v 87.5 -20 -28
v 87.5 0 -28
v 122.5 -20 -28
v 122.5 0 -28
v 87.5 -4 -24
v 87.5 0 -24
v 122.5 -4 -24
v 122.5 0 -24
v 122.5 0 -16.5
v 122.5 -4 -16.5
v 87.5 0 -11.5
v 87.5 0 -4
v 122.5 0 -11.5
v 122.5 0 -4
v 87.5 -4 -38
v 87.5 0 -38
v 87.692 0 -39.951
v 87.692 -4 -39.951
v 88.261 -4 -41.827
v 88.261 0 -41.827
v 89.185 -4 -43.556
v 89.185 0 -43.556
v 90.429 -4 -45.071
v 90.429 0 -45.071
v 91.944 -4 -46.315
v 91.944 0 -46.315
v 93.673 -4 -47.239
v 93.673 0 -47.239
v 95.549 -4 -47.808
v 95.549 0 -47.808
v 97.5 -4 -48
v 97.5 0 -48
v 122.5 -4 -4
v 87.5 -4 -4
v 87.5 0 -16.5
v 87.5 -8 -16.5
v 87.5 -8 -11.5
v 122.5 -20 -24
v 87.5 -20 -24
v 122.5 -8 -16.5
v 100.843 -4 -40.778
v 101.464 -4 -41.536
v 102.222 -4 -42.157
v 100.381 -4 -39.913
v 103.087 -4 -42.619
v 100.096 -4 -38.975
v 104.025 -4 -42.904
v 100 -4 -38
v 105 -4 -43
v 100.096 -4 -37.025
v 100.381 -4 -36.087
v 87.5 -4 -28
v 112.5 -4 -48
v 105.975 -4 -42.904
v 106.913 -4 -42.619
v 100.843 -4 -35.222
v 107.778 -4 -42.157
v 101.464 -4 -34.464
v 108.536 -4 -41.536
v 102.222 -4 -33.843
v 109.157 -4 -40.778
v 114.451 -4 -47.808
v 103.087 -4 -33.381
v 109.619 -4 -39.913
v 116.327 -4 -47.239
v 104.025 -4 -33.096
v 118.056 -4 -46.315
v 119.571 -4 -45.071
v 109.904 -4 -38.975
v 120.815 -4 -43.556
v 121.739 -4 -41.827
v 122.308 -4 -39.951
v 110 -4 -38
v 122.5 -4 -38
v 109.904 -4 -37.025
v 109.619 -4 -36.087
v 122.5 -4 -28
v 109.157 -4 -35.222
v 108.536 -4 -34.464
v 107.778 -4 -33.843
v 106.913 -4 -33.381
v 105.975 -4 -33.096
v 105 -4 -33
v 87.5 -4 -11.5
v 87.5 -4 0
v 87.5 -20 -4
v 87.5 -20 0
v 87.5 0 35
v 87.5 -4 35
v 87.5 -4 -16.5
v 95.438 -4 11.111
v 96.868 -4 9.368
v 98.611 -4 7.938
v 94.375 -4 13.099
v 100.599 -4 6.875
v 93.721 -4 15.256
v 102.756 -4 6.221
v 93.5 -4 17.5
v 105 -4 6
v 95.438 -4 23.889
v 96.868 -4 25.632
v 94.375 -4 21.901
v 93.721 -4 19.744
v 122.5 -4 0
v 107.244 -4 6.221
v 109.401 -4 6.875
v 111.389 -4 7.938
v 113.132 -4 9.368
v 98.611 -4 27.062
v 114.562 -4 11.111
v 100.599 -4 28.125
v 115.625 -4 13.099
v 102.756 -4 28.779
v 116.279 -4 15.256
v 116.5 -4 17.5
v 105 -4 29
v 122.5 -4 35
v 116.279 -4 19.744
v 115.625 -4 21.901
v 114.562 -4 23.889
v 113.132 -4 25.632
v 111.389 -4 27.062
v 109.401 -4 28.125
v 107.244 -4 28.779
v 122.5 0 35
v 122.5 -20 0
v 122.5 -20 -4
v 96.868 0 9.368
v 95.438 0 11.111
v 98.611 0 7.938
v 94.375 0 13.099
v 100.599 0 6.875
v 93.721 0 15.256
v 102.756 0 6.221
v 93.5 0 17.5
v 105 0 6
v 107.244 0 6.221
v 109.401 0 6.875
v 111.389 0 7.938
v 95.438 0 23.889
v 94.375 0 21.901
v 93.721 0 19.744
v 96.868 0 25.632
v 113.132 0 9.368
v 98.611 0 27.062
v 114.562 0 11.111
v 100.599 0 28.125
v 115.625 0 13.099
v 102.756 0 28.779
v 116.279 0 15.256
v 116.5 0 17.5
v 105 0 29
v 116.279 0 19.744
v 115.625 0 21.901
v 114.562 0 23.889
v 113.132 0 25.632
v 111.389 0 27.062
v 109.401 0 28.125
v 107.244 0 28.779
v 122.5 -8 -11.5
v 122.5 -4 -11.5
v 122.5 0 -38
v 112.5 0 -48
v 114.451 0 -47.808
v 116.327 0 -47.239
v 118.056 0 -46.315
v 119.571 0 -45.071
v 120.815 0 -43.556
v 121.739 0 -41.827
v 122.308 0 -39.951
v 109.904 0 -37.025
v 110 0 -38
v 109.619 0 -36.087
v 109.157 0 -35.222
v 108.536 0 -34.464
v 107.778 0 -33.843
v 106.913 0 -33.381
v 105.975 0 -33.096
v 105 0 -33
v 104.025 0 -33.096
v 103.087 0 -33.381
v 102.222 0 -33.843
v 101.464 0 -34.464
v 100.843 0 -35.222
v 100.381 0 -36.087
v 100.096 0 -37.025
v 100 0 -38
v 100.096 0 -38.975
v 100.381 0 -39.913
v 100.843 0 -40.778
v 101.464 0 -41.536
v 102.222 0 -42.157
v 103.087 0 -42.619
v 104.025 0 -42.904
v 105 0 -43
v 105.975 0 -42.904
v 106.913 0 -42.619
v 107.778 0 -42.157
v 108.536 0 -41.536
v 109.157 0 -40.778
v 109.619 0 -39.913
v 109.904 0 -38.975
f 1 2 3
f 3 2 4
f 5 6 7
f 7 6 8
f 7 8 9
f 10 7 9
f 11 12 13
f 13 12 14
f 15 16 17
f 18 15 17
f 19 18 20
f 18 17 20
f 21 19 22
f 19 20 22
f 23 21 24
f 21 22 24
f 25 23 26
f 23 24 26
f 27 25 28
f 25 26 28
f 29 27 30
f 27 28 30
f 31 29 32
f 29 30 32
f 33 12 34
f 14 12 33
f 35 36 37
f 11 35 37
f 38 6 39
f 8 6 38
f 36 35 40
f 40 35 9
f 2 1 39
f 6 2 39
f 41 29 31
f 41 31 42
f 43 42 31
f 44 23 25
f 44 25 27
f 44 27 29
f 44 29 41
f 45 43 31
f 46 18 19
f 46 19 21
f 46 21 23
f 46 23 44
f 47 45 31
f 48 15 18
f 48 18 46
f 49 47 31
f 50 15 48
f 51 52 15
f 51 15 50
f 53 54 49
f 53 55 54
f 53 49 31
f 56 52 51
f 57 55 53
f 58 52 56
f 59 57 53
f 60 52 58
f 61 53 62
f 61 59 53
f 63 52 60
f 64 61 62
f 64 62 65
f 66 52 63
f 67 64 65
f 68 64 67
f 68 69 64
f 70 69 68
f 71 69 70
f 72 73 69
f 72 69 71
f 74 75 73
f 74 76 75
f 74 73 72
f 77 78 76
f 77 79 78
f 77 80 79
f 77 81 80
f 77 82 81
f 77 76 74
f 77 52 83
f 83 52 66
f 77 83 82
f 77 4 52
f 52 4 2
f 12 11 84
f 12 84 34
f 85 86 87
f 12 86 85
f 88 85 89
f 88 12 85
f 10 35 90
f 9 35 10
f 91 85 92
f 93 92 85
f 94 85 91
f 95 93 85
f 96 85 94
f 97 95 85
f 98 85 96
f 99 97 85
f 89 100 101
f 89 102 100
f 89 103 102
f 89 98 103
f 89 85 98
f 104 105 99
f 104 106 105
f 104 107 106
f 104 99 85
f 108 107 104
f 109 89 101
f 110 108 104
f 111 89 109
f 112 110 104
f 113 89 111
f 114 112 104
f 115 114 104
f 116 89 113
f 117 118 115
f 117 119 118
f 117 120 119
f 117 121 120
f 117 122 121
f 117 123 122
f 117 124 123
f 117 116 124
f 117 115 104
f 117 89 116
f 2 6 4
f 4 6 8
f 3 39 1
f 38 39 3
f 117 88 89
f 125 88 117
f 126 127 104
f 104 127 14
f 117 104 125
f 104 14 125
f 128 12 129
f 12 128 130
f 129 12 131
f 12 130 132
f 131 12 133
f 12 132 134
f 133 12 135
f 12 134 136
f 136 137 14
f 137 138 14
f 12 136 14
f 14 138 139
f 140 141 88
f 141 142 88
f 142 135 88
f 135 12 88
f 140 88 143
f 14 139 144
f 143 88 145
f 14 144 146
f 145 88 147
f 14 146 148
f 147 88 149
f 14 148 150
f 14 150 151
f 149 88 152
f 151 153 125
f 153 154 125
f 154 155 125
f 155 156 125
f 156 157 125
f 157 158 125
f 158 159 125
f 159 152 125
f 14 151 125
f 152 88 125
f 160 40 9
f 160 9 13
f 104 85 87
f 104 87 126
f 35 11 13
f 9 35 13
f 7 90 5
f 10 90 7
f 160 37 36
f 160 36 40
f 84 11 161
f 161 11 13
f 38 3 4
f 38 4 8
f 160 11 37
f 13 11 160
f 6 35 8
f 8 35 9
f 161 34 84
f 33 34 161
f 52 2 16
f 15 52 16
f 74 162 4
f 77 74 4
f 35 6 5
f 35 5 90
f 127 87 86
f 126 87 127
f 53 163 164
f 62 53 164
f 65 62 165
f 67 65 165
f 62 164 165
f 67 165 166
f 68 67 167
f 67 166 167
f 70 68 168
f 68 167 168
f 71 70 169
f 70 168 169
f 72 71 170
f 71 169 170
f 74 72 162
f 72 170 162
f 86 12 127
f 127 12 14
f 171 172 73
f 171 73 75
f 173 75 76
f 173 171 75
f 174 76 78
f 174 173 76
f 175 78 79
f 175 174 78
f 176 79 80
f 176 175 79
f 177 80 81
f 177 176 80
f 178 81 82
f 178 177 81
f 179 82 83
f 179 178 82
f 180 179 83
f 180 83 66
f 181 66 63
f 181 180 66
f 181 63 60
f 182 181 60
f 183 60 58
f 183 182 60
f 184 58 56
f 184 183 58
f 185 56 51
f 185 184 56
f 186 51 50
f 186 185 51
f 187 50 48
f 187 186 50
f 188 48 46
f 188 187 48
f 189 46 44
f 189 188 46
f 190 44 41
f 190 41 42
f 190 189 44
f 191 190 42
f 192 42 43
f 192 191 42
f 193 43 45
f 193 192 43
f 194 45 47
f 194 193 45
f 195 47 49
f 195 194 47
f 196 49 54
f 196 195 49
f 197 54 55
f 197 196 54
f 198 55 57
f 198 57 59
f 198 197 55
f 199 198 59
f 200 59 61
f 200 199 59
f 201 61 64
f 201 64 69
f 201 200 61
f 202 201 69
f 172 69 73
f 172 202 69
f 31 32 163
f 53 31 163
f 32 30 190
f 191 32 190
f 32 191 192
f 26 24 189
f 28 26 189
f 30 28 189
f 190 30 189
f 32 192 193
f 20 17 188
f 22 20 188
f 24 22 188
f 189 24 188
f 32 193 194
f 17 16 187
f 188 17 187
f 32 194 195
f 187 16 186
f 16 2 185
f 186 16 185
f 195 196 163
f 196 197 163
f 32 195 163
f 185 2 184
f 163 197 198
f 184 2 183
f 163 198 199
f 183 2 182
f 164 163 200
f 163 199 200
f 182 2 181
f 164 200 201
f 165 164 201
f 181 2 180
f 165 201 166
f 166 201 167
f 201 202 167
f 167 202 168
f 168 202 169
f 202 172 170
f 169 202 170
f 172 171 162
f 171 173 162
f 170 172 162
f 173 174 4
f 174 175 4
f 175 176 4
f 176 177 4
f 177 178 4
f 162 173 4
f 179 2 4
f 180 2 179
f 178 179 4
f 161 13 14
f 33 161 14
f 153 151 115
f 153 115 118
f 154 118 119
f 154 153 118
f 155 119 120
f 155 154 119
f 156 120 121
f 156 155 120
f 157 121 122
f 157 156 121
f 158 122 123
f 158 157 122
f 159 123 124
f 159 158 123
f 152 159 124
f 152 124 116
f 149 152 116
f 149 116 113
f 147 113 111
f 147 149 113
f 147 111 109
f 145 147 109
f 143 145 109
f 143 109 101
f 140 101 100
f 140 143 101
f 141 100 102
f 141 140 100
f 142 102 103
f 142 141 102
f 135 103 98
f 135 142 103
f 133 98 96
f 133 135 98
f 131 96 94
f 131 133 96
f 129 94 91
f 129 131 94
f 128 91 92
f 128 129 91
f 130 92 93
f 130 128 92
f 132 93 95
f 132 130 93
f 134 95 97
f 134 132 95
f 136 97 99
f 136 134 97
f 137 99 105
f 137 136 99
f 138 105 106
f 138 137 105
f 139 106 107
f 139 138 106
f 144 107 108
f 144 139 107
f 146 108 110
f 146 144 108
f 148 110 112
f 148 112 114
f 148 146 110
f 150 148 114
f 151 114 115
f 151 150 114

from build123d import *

# Parameters (mm, degrees)
F0_W     = 35
F0_H     = 35
F0_R     = 11.5
F1_DEPTH = 4
F0_H_2   = 7.5
F0_R_2   = 5
F0_H_3   = 4
F2_DEPTH = 20
F0_H_4   = 5
F3_DEPTH = 8


with BuildPart() as f1:
    # F0 (on Front) → F1 (new body)
    with BuildSketch(Plane.XZ):
        with Locations((105, 17.5)):
            Rectangle(F0_W, F0_H)
        with Locations((105, 17.5)):
            Circle(F0_R, mode=Mode.SUBTRACT)
    extrude(amount=F1_DEPTH)

    # F0 (on Front) → F2 (join)
    with BuildSketch(Plane.XZ):
        with Locations((105, -2)):
            Rectangle(F0_W, F0_H_3)
    extrude(amount=F2_DEPTH)


with BuildPart() as f1b:
    # F0 (on Front) → F1, piece 2 (new body)
    with BuildSketch(Plane.XZ):
        with Locations((105, -7.75)):
            Rectangle(F0_W, F0_H_2)
    extrude(amount=F1_DEPTH)


with BuildPart() as f1c:
    # F0 (on Front) → F1, piece 3 (new body)
    with BuildSketch(Plane.XZ):
        with Locations((105, -20.25)):
            Rectangle(F0_W, F0_H_2)
    extrude(amount=F1_DEPTH)


with BuildPart() as f1d:
    # F0 (on Front) → F1, piece 4 (new body)
    with BuildSketch(Plane.XZ):
        with BuildLine():
            Line((122.5, -28), (87.5, -28))
            Line((87.5, -28), (87.5, -38))
            ThreePointArc((87.5, -38), (90.4289321881, -45.0710678119), (97.5, -48))
            Line((97.5, -48), (112.5, -48))
            ThreePointArc((112.5, -48), (119.5710678119, -45.0710678119), (122.5, -38))
            Line((122.5, -38), (122.5, -28))
        make_face()
        with Locations((105, -38)):
            Circle(F0_R_2, mode=Mode.SUBTRACT)
    extrude(amount=F1_DEPTH)


with BuildPart() as f2:
    # F0 (on Front) → F2, piece 2 (new body)
    with BuildSketch(Plane.XZ):
        with Locations((105, -26)):
            Rectangle(F0_W, F0_H_3)
    extrude(amount=F2_DEPTH)


with BuildPart() as f3:
    # F0 (on Front) → F3 (new body)
    with BuildSketch(Plane.XZ):
        with Locations((105, -14)):
            Rectangle(F0_W, F0_H_4)
    extrude(amount=F3_DEPTH)


solid = Compound([f1.part, f1b.part, f1c.part, f1d.part, f2.part, f3.part])
